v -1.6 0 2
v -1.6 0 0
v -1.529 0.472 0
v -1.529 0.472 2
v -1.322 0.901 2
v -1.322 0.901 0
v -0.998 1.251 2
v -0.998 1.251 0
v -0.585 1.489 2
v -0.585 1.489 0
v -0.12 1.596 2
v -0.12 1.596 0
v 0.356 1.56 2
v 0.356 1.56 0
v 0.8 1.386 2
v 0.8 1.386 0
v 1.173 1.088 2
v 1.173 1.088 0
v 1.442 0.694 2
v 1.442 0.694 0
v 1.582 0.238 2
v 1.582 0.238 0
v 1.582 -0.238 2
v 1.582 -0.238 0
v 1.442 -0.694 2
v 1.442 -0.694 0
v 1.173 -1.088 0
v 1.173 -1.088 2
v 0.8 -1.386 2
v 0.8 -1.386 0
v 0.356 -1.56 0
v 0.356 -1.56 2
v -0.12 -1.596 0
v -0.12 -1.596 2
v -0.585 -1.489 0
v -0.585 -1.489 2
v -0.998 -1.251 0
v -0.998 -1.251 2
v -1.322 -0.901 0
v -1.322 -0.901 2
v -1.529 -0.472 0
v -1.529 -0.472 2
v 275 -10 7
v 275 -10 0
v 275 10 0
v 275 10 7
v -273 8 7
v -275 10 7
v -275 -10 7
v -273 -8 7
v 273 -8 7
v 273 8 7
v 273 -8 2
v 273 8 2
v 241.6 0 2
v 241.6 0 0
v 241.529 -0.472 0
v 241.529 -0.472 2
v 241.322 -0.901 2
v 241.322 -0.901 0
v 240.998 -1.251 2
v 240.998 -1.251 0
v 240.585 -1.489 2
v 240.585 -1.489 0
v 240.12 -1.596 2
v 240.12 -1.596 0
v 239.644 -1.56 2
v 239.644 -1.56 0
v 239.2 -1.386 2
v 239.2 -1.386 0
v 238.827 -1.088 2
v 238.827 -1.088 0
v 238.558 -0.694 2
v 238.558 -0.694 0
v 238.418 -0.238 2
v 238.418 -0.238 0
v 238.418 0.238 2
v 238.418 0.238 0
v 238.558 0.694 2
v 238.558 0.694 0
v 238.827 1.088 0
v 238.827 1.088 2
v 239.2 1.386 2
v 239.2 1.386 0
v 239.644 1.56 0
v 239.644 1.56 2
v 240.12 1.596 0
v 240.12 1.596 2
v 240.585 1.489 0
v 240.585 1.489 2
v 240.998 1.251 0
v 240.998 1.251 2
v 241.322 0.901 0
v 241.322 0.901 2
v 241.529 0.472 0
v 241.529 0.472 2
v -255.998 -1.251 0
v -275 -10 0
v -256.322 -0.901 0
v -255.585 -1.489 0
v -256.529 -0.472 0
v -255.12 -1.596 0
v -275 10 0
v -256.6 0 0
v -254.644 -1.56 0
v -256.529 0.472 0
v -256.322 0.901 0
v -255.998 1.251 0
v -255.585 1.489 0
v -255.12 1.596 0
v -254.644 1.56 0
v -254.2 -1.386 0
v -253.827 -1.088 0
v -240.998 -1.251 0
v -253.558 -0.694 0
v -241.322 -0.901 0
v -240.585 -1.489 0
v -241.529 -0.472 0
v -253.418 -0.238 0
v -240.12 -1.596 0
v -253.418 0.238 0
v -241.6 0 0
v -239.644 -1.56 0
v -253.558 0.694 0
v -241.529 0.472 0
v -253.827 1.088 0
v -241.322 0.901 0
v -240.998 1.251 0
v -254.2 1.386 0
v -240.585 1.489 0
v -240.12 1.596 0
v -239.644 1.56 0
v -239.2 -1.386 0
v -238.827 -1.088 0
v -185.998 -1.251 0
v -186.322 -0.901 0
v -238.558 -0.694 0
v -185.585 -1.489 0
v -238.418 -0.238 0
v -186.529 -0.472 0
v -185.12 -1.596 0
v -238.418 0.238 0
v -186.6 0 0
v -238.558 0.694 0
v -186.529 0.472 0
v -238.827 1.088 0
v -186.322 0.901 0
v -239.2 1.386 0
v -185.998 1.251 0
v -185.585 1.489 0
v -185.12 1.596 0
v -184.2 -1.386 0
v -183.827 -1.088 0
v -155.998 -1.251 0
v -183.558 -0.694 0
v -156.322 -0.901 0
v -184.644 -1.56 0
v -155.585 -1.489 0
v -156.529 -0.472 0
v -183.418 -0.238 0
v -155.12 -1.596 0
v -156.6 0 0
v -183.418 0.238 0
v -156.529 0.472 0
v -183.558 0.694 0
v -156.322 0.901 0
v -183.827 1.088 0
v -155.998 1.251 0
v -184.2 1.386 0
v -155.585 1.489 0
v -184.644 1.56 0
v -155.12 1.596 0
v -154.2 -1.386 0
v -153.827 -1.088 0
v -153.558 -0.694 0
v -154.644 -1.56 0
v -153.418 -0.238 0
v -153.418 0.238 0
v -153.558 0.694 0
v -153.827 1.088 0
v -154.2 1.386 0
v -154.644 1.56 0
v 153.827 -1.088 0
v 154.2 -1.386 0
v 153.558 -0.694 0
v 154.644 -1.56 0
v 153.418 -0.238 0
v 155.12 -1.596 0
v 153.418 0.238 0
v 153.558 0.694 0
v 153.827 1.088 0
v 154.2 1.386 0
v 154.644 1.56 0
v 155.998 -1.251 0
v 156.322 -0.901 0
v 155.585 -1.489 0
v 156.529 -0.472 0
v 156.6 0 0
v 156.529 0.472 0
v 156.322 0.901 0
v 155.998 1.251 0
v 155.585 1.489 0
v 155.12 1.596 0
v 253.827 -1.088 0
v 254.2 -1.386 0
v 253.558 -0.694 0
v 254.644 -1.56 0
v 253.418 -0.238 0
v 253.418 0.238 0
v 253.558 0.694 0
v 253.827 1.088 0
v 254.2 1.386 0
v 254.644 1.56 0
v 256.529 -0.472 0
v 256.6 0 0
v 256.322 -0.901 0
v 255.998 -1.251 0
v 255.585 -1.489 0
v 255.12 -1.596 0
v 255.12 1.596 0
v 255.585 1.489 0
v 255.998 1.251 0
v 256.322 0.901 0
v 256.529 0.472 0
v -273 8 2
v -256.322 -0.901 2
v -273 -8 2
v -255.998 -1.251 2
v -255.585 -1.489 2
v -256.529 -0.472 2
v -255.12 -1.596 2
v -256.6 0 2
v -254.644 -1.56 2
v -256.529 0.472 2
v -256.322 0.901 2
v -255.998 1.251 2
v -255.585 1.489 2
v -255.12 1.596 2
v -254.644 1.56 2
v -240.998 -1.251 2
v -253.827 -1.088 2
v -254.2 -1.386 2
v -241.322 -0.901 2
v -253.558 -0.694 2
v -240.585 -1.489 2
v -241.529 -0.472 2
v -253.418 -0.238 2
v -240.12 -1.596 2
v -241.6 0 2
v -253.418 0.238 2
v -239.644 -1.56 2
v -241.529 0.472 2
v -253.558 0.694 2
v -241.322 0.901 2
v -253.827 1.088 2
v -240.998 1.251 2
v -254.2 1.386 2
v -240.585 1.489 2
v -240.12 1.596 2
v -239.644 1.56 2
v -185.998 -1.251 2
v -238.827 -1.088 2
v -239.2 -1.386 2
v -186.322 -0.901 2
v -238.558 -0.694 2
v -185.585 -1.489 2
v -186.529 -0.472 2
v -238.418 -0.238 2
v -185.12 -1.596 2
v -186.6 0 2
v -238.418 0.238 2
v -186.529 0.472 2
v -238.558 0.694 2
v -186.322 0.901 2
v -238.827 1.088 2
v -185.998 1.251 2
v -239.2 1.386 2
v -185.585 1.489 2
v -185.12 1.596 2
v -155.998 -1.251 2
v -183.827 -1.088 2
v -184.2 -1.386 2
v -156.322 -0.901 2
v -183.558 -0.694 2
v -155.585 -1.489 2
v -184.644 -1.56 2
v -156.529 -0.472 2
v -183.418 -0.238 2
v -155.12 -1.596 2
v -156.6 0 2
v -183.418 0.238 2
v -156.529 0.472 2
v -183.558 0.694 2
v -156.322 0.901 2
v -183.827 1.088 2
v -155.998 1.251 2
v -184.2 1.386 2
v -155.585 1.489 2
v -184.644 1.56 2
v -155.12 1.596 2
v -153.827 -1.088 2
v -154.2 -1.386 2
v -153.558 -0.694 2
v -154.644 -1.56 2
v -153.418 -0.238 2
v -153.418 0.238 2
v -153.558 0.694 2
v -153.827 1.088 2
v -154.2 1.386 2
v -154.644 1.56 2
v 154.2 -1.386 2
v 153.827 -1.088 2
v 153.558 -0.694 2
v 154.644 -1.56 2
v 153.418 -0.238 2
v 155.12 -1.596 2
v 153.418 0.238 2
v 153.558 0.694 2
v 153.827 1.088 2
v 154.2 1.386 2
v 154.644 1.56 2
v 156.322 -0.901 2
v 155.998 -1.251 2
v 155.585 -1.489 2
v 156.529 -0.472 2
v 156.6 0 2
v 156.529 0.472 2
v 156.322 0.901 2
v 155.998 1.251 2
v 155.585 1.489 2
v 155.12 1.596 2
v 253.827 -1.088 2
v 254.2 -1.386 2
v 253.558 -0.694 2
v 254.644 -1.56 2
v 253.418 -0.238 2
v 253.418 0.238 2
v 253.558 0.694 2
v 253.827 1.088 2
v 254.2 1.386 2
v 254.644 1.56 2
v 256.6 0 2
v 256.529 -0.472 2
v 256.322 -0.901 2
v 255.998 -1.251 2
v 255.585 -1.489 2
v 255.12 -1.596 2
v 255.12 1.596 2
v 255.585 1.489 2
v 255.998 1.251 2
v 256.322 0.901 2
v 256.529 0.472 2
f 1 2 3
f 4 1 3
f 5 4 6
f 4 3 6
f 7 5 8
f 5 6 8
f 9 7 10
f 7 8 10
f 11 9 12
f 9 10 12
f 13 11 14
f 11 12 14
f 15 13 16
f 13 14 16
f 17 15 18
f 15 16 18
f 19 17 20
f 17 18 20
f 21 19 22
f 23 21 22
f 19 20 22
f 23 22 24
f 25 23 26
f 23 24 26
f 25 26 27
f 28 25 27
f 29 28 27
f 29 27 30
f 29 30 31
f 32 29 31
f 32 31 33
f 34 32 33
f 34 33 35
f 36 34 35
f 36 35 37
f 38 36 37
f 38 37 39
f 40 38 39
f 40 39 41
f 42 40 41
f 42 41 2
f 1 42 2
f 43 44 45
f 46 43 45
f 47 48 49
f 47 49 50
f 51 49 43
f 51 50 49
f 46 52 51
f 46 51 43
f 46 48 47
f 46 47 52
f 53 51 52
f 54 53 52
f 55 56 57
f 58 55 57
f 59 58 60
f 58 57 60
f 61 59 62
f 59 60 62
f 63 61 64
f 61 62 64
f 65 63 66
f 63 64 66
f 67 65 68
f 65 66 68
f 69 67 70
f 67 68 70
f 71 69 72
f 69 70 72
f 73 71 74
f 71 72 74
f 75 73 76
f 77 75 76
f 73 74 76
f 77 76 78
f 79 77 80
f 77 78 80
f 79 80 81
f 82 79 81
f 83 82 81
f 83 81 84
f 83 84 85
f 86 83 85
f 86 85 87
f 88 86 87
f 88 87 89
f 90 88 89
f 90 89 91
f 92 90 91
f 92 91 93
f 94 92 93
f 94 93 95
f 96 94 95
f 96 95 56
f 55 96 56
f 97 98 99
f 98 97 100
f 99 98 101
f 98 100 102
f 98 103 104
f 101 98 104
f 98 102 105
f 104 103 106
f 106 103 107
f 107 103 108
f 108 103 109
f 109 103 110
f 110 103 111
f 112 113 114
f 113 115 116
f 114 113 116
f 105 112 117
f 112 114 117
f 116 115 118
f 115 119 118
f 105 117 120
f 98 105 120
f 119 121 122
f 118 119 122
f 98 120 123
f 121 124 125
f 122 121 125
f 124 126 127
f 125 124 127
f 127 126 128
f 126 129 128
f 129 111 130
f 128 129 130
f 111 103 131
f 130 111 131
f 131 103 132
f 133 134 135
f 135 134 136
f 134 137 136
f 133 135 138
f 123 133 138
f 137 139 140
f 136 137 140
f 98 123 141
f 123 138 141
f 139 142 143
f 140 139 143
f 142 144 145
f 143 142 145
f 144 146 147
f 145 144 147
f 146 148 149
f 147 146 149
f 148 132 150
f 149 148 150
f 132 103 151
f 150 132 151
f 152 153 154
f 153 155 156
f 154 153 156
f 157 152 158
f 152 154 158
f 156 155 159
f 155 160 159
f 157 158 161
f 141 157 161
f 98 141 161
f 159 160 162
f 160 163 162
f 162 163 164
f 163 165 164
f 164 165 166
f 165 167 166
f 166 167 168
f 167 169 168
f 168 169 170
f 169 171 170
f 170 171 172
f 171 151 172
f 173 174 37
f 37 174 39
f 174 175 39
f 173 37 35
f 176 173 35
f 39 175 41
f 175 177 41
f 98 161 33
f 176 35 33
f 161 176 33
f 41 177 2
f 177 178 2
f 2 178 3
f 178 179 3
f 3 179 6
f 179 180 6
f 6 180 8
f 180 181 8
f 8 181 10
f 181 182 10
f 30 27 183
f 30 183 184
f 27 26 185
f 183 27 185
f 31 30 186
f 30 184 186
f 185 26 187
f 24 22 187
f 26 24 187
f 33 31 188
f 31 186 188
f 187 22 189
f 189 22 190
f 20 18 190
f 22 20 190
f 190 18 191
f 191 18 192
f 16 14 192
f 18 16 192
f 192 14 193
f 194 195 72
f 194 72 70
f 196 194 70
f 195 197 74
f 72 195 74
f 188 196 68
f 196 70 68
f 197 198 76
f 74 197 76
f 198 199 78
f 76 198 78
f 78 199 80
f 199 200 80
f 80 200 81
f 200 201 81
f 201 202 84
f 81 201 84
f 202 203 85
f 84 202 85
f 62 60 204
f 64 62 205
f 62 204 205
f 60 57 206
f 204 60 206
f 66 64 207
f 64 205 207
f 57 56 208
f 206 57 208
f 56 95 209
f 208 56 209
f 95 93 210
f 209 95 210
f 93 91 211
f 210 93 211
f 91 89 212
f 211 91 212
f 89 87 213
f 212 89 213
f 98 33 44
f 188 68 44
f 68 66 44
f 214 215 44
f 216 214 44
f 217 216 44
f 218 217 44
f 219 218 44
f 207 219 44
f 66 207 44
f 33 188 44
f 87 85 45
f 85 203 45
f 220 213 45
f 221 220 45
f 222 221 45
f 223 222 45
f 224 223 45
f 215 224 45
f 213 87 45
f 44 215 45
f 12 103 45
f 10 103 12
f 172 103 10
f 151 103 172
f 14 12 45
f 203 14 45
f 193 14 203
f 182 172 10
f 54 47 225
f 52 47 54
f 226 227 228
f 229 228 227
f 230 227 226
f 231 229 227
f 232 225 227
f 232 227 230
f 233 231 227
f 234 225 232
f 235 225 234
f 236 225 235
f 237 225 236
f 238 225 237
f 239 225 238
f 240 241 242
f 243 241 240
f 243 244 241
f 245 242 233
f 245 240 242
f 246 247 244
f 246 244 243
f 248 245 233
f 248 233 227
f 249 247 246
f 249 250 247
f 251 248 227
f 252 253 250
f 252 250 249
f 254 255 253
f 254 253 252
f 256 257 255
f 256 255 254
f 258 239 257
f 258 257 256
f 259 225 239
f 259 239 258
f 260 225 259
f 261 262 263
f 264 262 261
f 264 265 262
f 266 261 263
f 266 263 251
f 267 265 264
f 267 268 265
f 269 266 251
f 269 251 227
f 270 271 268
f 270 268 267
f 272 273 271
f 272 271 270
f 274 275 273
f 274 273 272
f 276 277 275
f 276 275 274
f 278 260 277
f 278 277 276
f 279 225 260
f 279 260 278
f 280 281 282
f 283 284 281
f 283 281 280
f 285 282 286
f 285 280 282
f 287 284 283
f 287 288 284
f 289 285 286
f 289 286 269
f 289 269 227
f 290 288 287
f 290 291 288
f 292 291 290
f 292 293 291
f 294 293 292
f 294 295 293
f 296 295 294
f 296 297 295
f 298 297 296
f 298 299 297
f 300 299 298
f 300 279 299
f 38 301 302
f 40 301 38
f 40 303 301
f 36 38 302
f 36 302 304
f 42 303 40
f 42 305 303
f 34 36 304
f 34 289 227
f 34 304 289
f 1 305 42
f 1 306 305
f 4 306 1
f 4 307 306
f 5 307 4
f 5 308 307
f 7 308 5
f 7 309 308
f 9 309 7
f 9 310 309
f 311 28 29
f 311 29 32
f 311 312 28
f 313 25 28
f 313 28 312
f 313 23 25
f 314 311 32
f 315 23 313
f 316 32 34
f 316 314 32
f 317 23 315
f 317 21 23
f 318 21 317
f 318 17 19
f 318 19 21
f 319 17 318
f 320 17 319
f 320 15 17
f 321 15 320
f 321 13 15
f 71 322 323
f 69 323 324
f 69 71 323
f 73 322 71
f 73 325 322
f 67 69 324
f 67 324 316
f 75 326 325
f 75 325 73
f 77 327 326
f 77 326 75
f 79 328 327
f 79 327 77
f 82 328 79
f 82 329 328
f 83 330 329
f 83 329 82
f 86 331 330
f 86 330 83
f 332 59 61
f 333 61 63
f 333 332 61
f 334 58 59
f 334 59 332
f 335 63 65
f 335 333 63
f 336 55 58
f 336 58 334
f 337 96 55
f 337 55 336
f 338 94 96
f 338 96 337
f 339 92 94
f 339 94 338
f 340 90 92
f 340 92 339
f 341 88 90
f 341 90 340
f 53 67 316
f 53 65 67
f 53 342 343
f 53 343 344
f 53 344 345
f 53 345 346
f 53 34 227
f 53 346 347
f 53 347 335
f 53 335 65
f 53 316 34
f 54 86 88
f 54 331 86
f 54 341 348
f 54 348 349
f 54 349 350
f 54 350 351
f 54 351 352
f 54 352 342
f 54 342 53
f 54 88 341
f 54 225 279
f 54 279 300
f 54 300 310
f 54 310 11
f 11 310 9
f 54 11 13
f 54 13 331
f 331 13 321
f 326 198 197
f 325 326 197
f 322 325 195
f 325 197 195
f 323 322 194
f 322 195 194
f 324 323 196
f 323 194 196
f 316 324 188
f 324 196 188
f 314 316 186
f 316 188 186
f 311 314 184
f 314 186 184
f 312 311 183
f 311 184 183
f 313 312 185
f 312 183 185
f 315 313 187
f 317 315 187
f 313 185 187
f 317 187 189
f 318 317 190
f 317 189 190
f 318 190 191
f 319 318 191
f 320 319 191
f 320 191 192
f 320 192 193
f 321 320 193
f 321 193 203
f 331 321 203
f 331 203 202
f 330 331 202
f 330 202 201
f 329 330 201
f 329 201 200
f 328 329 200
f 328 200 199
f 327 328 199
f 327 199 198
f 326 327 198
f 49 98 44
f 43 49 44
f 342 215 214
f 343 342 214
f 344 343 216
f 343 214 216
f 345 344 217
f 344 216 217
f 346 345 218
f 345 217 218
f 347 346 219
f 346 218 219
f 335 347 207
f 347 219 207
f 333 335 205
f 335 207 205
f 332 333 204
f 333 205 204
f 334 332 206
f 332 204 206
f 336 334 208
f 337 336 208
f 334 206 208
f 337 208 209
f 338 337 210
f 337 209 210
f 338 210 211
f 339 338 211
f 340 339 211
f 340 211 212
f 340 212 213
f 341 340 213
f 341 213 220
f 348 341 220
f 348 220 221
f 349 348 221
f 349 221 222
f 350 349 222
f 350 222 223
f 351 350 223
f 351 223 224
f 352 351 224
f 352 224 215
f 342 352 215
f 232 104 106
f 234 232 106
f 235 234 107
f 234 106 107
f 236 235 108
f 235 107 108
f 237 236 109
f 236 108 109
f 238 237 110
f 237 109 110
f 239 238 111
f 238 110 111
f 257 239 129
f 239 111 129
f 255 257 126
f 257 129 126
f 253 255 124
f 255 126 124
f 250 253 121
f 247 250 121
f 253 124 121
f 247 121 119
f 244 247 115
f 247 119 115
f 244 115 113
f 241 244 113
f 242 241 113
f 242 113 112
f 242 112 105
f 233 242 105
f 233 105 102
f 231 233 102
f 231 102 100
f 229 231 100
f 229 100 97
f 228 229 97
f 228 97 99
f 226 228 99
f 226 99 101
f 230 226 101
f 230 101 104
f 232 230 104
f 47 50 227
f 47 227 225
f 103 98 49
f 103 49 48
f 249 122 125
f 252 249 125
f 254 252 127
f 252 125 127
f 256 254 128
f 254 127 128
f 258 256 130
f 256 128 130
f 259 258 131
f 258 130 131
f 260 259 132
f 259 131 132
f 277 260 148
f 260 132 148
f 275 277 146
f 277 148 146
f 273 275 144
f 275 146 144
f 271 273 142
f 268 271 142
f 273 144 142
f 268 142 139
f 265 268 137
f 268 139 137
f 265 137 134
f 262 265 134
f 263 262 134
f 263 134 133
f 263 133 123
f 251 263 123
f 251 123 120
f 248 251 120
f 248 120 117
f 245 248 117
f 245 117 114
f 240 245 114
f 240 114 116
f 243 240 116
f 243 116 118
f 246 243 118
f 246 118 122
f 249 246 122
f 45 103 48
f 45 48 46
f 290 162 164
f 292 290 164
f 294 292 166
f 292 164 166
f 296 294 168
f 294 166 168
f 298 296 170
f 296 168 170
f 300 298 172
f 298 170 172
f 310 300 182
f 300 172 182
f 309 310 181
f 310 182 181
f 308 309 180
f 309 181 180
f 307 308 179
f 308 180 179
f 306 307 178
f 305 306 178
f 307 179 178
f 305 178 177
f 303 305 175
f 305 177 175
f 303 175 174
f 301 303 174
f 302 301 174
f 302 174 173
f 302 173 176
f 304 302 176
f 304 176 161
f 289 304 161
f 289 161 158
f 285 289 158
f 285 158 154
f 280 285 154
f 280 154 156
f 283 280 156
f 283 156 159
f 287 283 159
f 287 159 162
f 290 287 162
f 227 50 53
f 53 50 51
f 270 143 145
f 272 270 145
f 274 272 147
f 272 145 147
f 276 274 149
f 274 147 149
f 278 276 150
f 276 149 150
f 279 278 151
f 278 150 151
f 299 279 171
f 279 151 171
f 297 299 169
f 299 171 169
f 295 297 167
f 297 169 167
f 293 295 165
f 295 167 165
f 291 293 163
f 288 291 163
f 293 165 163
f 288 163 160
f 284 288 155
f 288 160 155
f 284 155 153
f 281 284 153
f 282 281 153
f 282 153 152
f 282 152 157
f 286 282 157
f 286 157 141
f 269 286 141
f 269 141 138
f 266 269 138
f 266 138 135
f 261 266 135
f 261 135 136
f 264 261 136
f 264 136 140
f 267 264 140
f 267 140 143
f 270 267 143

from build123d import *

# Parameters (mm, degrees)
SKETCH_1_W          = 550
SKETCH_1_H          = 20
EXTRUDE_1_DEPTH     = 7
SKETCH_2_W          = 546
SKETCH_2_H          = 16
CUT_EXTRUDE_1_DEPTH = 5
SKETCH_3_R          = 1.6
CUT_EXTRUDE_2_DEPTH = 276.270775783
SKETCH_4_R          = 1.6
CUT_EXTRUDE_3_DEPTH = 276.270775783


with BuildPart() as part:
    # ｽｹｯﾁ1 → ﾎﾞｽ - 押し出し1 (new body)
    with BuildSketch(Plane.XY):
        Rectangle(SKETCH_1_W, SKETCH_1_H)
    extrude(amount=EXTRUDE_1_DEPTH)

    # ｽｹｯﾁ2 → ｶｯﾄ - 押し出し1 (cut)
    with BuildSketch(Plane.XY.offset(7)):
        Rectangle(SKETCH_2_W, SKETCH_2_H)
    extrude(amount=-CUT_EXTRUDE_1_DEPTH, mode=Mode.SUBTRACT)

    # ｽｹｯﾁ3 → ｶｯﾄ - 押し出し2 (cut, through all)
    with BuildSketch(Plane(origin=(0, 0, 0), x_dir=(-1, 0, 0), z_dir=(0, 0, -1))):
        with Locations((255, 0)):
            Circle(SKETCH_3_R)
        with Locations((240, 0)):
            Circle(SKETCH_3_R)
        with Locations((155, 0)):
            Circle(SKETCH_3_R)
        Circle(SKETCH_3_R)
        with Locations(Location((-255, 0, 0), (0, 0, 180))):
            Circle(SKETCH_3_R)
        with Locations(Location((-240, 0, 0), (0, 0, 180))):
            Circle(SKETCH_3_R)
        with Locations(Location((-155, 0, 0), (0, 0, 180))):
            Circle(SKETCH_3_R)
    extrude(amount=-CUT_EXTRUDE_2_DEPTH, mode=Mode.SUBTRACT)

    # ｽｹｯﾁ4 → ｶｯﾄ - 押し出し3 (cut, through all)
    with BuildSketch(Plane(origin=(0, 0, 0), x_dir=(-1, 0, 0), z_dir=(0, 0, -1))):
        with Locations((185, 0)):
            Circle(SKETCH_4_R)
    extrude(amount=-CUT_EXTRUDE_3_DEPTH, mode=Mode.SUBTRACT)


solid = part.part
